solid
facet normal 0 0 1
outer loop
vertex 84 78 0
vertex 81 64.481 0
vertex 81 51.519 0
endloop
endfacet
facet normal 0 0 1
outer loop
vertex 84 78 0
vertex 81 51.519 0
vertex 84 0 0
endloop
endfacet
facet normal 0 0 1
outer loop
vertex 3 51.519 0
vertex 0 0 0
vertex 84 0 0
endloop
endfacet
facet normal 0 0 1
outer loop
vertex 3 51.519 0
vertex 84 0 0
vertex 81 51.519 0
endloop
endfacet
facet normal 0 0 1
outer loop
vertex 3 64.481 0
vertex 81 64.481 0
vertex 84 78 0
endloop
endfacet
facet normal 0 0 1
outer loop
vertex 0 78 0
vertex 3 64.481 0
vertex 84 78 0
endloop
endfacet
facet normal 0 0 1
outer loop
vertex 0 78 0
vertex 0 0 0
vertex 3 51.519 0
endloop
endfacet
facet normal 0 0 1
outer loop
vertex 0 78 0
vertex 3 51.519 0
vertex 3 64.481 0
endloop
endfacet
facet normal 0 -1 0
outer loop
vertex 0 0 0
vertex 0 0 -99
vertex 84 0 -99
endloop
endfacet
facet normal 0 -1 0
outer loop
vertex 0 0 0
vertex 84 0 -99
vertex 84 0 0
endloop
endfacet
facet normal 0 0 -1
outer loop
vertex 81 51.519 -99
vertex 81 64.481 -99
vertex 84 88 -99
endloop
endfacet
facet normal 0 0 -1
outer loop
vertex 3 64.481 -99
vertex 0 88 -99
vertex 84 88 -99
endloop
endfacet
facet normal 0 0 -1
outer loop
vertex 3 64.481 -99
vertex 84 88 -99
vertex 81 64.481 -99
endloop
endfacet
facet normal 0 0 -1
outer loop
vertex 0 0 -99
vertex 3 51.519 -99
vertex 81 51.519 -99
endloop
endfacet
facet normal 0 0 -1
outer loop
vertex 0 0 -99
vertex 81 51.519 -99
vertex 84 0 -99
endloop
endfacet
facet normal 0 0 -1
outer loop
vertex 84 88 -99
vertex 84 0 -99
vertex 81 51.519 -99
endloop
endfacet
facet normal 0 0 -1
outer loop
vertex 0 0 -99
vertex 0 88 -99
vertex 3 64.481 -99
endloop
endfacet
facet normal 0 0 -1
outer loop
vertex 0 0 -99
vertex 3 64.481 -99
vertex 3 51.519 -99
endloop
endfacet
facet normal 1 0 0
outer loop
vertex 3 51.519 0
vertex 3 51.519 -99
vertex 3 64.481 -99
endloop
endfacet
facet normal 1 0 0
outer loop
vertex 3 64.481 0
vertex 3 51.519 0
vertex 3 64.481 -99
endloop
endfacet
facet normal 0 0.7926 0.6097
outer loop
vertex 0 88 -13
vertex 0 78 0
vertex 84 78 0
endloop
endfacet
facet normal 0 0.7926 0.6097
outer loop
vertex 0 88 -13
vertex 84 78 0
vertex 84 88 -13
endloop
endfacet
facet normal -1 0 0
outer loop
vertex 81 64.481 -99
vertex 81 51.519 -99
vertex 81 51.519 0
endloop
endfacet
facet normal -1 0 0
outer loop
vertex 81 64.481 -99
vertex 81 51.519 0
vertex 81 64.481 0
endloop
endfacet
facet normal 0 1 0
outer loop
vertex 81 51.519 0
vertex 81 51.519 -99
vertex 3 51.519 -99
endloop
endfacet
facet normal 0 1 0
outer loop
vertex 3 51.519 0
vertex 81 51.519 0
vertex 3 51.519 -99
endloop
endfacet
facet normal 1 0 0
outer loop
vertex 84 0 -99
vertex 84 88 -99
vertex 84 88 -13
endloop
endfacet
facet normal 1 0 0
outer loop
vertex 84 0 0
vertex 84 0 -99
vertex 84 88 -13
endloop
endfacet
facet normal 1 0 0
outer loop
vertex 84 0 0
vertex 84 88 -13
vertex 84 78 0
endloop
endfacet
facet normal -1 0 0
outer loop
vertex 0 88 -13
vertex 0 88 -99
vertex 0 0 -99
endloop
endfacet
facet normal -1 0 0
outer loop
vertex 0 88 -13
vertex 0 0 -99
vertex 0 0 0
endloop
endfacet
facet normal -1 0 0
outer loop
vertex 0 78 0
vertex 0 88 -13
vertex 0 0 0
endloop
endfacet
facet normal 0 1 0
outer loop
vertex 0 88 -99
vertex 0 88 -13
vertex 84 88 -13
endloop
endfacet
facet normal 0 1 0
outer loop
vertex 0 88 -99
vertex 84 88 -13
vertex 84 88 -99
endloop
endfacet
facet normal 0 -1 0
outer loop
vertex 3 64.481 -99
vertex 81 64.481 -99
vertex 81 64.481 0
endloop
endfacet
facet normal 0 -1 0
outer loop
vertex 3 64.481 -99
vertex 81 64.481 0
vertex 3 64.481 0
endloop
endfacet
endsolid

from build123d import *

# Parameters (mm, degrees)
BOSS_EXTRUDE1_DEPTH = 84
SKETCH2_W           = 78
SKETCH2_H           = 12.96225643
CUT_EXTRUDE1_DEPTH  = 157.847059265


with BuildPart() as part:
    # Sketch1 → Boss-Extrude1 (new body)
    with BuildSketch(Plane(origin=(0, 0, 0), x_dir=(0, 0, -1), z_dir=(1, 0, 0))):
        Polygon((0, 0), (0, 78), (13, 88), (99, 88), (99, 0), align=None)
    extrude(amount=BOSS_EXTRUDE1_DEPTH)

    # Sketch2 → Cut-Extrude1 (cut, through all)
    with BuildSketch(Plane(origin=(0, 0, -99), x_dir=(-1, 0, 0), z_dir=(0, 0, -1))):
        with Locations((-42, 58)):
            Rectangle(SKETCH2_W, SKETCH2_H)
    extrude(amount=-CUT_EXTRUDE1_DEPTH, mode=Mode.SUBTRACT)


solid = part.part
